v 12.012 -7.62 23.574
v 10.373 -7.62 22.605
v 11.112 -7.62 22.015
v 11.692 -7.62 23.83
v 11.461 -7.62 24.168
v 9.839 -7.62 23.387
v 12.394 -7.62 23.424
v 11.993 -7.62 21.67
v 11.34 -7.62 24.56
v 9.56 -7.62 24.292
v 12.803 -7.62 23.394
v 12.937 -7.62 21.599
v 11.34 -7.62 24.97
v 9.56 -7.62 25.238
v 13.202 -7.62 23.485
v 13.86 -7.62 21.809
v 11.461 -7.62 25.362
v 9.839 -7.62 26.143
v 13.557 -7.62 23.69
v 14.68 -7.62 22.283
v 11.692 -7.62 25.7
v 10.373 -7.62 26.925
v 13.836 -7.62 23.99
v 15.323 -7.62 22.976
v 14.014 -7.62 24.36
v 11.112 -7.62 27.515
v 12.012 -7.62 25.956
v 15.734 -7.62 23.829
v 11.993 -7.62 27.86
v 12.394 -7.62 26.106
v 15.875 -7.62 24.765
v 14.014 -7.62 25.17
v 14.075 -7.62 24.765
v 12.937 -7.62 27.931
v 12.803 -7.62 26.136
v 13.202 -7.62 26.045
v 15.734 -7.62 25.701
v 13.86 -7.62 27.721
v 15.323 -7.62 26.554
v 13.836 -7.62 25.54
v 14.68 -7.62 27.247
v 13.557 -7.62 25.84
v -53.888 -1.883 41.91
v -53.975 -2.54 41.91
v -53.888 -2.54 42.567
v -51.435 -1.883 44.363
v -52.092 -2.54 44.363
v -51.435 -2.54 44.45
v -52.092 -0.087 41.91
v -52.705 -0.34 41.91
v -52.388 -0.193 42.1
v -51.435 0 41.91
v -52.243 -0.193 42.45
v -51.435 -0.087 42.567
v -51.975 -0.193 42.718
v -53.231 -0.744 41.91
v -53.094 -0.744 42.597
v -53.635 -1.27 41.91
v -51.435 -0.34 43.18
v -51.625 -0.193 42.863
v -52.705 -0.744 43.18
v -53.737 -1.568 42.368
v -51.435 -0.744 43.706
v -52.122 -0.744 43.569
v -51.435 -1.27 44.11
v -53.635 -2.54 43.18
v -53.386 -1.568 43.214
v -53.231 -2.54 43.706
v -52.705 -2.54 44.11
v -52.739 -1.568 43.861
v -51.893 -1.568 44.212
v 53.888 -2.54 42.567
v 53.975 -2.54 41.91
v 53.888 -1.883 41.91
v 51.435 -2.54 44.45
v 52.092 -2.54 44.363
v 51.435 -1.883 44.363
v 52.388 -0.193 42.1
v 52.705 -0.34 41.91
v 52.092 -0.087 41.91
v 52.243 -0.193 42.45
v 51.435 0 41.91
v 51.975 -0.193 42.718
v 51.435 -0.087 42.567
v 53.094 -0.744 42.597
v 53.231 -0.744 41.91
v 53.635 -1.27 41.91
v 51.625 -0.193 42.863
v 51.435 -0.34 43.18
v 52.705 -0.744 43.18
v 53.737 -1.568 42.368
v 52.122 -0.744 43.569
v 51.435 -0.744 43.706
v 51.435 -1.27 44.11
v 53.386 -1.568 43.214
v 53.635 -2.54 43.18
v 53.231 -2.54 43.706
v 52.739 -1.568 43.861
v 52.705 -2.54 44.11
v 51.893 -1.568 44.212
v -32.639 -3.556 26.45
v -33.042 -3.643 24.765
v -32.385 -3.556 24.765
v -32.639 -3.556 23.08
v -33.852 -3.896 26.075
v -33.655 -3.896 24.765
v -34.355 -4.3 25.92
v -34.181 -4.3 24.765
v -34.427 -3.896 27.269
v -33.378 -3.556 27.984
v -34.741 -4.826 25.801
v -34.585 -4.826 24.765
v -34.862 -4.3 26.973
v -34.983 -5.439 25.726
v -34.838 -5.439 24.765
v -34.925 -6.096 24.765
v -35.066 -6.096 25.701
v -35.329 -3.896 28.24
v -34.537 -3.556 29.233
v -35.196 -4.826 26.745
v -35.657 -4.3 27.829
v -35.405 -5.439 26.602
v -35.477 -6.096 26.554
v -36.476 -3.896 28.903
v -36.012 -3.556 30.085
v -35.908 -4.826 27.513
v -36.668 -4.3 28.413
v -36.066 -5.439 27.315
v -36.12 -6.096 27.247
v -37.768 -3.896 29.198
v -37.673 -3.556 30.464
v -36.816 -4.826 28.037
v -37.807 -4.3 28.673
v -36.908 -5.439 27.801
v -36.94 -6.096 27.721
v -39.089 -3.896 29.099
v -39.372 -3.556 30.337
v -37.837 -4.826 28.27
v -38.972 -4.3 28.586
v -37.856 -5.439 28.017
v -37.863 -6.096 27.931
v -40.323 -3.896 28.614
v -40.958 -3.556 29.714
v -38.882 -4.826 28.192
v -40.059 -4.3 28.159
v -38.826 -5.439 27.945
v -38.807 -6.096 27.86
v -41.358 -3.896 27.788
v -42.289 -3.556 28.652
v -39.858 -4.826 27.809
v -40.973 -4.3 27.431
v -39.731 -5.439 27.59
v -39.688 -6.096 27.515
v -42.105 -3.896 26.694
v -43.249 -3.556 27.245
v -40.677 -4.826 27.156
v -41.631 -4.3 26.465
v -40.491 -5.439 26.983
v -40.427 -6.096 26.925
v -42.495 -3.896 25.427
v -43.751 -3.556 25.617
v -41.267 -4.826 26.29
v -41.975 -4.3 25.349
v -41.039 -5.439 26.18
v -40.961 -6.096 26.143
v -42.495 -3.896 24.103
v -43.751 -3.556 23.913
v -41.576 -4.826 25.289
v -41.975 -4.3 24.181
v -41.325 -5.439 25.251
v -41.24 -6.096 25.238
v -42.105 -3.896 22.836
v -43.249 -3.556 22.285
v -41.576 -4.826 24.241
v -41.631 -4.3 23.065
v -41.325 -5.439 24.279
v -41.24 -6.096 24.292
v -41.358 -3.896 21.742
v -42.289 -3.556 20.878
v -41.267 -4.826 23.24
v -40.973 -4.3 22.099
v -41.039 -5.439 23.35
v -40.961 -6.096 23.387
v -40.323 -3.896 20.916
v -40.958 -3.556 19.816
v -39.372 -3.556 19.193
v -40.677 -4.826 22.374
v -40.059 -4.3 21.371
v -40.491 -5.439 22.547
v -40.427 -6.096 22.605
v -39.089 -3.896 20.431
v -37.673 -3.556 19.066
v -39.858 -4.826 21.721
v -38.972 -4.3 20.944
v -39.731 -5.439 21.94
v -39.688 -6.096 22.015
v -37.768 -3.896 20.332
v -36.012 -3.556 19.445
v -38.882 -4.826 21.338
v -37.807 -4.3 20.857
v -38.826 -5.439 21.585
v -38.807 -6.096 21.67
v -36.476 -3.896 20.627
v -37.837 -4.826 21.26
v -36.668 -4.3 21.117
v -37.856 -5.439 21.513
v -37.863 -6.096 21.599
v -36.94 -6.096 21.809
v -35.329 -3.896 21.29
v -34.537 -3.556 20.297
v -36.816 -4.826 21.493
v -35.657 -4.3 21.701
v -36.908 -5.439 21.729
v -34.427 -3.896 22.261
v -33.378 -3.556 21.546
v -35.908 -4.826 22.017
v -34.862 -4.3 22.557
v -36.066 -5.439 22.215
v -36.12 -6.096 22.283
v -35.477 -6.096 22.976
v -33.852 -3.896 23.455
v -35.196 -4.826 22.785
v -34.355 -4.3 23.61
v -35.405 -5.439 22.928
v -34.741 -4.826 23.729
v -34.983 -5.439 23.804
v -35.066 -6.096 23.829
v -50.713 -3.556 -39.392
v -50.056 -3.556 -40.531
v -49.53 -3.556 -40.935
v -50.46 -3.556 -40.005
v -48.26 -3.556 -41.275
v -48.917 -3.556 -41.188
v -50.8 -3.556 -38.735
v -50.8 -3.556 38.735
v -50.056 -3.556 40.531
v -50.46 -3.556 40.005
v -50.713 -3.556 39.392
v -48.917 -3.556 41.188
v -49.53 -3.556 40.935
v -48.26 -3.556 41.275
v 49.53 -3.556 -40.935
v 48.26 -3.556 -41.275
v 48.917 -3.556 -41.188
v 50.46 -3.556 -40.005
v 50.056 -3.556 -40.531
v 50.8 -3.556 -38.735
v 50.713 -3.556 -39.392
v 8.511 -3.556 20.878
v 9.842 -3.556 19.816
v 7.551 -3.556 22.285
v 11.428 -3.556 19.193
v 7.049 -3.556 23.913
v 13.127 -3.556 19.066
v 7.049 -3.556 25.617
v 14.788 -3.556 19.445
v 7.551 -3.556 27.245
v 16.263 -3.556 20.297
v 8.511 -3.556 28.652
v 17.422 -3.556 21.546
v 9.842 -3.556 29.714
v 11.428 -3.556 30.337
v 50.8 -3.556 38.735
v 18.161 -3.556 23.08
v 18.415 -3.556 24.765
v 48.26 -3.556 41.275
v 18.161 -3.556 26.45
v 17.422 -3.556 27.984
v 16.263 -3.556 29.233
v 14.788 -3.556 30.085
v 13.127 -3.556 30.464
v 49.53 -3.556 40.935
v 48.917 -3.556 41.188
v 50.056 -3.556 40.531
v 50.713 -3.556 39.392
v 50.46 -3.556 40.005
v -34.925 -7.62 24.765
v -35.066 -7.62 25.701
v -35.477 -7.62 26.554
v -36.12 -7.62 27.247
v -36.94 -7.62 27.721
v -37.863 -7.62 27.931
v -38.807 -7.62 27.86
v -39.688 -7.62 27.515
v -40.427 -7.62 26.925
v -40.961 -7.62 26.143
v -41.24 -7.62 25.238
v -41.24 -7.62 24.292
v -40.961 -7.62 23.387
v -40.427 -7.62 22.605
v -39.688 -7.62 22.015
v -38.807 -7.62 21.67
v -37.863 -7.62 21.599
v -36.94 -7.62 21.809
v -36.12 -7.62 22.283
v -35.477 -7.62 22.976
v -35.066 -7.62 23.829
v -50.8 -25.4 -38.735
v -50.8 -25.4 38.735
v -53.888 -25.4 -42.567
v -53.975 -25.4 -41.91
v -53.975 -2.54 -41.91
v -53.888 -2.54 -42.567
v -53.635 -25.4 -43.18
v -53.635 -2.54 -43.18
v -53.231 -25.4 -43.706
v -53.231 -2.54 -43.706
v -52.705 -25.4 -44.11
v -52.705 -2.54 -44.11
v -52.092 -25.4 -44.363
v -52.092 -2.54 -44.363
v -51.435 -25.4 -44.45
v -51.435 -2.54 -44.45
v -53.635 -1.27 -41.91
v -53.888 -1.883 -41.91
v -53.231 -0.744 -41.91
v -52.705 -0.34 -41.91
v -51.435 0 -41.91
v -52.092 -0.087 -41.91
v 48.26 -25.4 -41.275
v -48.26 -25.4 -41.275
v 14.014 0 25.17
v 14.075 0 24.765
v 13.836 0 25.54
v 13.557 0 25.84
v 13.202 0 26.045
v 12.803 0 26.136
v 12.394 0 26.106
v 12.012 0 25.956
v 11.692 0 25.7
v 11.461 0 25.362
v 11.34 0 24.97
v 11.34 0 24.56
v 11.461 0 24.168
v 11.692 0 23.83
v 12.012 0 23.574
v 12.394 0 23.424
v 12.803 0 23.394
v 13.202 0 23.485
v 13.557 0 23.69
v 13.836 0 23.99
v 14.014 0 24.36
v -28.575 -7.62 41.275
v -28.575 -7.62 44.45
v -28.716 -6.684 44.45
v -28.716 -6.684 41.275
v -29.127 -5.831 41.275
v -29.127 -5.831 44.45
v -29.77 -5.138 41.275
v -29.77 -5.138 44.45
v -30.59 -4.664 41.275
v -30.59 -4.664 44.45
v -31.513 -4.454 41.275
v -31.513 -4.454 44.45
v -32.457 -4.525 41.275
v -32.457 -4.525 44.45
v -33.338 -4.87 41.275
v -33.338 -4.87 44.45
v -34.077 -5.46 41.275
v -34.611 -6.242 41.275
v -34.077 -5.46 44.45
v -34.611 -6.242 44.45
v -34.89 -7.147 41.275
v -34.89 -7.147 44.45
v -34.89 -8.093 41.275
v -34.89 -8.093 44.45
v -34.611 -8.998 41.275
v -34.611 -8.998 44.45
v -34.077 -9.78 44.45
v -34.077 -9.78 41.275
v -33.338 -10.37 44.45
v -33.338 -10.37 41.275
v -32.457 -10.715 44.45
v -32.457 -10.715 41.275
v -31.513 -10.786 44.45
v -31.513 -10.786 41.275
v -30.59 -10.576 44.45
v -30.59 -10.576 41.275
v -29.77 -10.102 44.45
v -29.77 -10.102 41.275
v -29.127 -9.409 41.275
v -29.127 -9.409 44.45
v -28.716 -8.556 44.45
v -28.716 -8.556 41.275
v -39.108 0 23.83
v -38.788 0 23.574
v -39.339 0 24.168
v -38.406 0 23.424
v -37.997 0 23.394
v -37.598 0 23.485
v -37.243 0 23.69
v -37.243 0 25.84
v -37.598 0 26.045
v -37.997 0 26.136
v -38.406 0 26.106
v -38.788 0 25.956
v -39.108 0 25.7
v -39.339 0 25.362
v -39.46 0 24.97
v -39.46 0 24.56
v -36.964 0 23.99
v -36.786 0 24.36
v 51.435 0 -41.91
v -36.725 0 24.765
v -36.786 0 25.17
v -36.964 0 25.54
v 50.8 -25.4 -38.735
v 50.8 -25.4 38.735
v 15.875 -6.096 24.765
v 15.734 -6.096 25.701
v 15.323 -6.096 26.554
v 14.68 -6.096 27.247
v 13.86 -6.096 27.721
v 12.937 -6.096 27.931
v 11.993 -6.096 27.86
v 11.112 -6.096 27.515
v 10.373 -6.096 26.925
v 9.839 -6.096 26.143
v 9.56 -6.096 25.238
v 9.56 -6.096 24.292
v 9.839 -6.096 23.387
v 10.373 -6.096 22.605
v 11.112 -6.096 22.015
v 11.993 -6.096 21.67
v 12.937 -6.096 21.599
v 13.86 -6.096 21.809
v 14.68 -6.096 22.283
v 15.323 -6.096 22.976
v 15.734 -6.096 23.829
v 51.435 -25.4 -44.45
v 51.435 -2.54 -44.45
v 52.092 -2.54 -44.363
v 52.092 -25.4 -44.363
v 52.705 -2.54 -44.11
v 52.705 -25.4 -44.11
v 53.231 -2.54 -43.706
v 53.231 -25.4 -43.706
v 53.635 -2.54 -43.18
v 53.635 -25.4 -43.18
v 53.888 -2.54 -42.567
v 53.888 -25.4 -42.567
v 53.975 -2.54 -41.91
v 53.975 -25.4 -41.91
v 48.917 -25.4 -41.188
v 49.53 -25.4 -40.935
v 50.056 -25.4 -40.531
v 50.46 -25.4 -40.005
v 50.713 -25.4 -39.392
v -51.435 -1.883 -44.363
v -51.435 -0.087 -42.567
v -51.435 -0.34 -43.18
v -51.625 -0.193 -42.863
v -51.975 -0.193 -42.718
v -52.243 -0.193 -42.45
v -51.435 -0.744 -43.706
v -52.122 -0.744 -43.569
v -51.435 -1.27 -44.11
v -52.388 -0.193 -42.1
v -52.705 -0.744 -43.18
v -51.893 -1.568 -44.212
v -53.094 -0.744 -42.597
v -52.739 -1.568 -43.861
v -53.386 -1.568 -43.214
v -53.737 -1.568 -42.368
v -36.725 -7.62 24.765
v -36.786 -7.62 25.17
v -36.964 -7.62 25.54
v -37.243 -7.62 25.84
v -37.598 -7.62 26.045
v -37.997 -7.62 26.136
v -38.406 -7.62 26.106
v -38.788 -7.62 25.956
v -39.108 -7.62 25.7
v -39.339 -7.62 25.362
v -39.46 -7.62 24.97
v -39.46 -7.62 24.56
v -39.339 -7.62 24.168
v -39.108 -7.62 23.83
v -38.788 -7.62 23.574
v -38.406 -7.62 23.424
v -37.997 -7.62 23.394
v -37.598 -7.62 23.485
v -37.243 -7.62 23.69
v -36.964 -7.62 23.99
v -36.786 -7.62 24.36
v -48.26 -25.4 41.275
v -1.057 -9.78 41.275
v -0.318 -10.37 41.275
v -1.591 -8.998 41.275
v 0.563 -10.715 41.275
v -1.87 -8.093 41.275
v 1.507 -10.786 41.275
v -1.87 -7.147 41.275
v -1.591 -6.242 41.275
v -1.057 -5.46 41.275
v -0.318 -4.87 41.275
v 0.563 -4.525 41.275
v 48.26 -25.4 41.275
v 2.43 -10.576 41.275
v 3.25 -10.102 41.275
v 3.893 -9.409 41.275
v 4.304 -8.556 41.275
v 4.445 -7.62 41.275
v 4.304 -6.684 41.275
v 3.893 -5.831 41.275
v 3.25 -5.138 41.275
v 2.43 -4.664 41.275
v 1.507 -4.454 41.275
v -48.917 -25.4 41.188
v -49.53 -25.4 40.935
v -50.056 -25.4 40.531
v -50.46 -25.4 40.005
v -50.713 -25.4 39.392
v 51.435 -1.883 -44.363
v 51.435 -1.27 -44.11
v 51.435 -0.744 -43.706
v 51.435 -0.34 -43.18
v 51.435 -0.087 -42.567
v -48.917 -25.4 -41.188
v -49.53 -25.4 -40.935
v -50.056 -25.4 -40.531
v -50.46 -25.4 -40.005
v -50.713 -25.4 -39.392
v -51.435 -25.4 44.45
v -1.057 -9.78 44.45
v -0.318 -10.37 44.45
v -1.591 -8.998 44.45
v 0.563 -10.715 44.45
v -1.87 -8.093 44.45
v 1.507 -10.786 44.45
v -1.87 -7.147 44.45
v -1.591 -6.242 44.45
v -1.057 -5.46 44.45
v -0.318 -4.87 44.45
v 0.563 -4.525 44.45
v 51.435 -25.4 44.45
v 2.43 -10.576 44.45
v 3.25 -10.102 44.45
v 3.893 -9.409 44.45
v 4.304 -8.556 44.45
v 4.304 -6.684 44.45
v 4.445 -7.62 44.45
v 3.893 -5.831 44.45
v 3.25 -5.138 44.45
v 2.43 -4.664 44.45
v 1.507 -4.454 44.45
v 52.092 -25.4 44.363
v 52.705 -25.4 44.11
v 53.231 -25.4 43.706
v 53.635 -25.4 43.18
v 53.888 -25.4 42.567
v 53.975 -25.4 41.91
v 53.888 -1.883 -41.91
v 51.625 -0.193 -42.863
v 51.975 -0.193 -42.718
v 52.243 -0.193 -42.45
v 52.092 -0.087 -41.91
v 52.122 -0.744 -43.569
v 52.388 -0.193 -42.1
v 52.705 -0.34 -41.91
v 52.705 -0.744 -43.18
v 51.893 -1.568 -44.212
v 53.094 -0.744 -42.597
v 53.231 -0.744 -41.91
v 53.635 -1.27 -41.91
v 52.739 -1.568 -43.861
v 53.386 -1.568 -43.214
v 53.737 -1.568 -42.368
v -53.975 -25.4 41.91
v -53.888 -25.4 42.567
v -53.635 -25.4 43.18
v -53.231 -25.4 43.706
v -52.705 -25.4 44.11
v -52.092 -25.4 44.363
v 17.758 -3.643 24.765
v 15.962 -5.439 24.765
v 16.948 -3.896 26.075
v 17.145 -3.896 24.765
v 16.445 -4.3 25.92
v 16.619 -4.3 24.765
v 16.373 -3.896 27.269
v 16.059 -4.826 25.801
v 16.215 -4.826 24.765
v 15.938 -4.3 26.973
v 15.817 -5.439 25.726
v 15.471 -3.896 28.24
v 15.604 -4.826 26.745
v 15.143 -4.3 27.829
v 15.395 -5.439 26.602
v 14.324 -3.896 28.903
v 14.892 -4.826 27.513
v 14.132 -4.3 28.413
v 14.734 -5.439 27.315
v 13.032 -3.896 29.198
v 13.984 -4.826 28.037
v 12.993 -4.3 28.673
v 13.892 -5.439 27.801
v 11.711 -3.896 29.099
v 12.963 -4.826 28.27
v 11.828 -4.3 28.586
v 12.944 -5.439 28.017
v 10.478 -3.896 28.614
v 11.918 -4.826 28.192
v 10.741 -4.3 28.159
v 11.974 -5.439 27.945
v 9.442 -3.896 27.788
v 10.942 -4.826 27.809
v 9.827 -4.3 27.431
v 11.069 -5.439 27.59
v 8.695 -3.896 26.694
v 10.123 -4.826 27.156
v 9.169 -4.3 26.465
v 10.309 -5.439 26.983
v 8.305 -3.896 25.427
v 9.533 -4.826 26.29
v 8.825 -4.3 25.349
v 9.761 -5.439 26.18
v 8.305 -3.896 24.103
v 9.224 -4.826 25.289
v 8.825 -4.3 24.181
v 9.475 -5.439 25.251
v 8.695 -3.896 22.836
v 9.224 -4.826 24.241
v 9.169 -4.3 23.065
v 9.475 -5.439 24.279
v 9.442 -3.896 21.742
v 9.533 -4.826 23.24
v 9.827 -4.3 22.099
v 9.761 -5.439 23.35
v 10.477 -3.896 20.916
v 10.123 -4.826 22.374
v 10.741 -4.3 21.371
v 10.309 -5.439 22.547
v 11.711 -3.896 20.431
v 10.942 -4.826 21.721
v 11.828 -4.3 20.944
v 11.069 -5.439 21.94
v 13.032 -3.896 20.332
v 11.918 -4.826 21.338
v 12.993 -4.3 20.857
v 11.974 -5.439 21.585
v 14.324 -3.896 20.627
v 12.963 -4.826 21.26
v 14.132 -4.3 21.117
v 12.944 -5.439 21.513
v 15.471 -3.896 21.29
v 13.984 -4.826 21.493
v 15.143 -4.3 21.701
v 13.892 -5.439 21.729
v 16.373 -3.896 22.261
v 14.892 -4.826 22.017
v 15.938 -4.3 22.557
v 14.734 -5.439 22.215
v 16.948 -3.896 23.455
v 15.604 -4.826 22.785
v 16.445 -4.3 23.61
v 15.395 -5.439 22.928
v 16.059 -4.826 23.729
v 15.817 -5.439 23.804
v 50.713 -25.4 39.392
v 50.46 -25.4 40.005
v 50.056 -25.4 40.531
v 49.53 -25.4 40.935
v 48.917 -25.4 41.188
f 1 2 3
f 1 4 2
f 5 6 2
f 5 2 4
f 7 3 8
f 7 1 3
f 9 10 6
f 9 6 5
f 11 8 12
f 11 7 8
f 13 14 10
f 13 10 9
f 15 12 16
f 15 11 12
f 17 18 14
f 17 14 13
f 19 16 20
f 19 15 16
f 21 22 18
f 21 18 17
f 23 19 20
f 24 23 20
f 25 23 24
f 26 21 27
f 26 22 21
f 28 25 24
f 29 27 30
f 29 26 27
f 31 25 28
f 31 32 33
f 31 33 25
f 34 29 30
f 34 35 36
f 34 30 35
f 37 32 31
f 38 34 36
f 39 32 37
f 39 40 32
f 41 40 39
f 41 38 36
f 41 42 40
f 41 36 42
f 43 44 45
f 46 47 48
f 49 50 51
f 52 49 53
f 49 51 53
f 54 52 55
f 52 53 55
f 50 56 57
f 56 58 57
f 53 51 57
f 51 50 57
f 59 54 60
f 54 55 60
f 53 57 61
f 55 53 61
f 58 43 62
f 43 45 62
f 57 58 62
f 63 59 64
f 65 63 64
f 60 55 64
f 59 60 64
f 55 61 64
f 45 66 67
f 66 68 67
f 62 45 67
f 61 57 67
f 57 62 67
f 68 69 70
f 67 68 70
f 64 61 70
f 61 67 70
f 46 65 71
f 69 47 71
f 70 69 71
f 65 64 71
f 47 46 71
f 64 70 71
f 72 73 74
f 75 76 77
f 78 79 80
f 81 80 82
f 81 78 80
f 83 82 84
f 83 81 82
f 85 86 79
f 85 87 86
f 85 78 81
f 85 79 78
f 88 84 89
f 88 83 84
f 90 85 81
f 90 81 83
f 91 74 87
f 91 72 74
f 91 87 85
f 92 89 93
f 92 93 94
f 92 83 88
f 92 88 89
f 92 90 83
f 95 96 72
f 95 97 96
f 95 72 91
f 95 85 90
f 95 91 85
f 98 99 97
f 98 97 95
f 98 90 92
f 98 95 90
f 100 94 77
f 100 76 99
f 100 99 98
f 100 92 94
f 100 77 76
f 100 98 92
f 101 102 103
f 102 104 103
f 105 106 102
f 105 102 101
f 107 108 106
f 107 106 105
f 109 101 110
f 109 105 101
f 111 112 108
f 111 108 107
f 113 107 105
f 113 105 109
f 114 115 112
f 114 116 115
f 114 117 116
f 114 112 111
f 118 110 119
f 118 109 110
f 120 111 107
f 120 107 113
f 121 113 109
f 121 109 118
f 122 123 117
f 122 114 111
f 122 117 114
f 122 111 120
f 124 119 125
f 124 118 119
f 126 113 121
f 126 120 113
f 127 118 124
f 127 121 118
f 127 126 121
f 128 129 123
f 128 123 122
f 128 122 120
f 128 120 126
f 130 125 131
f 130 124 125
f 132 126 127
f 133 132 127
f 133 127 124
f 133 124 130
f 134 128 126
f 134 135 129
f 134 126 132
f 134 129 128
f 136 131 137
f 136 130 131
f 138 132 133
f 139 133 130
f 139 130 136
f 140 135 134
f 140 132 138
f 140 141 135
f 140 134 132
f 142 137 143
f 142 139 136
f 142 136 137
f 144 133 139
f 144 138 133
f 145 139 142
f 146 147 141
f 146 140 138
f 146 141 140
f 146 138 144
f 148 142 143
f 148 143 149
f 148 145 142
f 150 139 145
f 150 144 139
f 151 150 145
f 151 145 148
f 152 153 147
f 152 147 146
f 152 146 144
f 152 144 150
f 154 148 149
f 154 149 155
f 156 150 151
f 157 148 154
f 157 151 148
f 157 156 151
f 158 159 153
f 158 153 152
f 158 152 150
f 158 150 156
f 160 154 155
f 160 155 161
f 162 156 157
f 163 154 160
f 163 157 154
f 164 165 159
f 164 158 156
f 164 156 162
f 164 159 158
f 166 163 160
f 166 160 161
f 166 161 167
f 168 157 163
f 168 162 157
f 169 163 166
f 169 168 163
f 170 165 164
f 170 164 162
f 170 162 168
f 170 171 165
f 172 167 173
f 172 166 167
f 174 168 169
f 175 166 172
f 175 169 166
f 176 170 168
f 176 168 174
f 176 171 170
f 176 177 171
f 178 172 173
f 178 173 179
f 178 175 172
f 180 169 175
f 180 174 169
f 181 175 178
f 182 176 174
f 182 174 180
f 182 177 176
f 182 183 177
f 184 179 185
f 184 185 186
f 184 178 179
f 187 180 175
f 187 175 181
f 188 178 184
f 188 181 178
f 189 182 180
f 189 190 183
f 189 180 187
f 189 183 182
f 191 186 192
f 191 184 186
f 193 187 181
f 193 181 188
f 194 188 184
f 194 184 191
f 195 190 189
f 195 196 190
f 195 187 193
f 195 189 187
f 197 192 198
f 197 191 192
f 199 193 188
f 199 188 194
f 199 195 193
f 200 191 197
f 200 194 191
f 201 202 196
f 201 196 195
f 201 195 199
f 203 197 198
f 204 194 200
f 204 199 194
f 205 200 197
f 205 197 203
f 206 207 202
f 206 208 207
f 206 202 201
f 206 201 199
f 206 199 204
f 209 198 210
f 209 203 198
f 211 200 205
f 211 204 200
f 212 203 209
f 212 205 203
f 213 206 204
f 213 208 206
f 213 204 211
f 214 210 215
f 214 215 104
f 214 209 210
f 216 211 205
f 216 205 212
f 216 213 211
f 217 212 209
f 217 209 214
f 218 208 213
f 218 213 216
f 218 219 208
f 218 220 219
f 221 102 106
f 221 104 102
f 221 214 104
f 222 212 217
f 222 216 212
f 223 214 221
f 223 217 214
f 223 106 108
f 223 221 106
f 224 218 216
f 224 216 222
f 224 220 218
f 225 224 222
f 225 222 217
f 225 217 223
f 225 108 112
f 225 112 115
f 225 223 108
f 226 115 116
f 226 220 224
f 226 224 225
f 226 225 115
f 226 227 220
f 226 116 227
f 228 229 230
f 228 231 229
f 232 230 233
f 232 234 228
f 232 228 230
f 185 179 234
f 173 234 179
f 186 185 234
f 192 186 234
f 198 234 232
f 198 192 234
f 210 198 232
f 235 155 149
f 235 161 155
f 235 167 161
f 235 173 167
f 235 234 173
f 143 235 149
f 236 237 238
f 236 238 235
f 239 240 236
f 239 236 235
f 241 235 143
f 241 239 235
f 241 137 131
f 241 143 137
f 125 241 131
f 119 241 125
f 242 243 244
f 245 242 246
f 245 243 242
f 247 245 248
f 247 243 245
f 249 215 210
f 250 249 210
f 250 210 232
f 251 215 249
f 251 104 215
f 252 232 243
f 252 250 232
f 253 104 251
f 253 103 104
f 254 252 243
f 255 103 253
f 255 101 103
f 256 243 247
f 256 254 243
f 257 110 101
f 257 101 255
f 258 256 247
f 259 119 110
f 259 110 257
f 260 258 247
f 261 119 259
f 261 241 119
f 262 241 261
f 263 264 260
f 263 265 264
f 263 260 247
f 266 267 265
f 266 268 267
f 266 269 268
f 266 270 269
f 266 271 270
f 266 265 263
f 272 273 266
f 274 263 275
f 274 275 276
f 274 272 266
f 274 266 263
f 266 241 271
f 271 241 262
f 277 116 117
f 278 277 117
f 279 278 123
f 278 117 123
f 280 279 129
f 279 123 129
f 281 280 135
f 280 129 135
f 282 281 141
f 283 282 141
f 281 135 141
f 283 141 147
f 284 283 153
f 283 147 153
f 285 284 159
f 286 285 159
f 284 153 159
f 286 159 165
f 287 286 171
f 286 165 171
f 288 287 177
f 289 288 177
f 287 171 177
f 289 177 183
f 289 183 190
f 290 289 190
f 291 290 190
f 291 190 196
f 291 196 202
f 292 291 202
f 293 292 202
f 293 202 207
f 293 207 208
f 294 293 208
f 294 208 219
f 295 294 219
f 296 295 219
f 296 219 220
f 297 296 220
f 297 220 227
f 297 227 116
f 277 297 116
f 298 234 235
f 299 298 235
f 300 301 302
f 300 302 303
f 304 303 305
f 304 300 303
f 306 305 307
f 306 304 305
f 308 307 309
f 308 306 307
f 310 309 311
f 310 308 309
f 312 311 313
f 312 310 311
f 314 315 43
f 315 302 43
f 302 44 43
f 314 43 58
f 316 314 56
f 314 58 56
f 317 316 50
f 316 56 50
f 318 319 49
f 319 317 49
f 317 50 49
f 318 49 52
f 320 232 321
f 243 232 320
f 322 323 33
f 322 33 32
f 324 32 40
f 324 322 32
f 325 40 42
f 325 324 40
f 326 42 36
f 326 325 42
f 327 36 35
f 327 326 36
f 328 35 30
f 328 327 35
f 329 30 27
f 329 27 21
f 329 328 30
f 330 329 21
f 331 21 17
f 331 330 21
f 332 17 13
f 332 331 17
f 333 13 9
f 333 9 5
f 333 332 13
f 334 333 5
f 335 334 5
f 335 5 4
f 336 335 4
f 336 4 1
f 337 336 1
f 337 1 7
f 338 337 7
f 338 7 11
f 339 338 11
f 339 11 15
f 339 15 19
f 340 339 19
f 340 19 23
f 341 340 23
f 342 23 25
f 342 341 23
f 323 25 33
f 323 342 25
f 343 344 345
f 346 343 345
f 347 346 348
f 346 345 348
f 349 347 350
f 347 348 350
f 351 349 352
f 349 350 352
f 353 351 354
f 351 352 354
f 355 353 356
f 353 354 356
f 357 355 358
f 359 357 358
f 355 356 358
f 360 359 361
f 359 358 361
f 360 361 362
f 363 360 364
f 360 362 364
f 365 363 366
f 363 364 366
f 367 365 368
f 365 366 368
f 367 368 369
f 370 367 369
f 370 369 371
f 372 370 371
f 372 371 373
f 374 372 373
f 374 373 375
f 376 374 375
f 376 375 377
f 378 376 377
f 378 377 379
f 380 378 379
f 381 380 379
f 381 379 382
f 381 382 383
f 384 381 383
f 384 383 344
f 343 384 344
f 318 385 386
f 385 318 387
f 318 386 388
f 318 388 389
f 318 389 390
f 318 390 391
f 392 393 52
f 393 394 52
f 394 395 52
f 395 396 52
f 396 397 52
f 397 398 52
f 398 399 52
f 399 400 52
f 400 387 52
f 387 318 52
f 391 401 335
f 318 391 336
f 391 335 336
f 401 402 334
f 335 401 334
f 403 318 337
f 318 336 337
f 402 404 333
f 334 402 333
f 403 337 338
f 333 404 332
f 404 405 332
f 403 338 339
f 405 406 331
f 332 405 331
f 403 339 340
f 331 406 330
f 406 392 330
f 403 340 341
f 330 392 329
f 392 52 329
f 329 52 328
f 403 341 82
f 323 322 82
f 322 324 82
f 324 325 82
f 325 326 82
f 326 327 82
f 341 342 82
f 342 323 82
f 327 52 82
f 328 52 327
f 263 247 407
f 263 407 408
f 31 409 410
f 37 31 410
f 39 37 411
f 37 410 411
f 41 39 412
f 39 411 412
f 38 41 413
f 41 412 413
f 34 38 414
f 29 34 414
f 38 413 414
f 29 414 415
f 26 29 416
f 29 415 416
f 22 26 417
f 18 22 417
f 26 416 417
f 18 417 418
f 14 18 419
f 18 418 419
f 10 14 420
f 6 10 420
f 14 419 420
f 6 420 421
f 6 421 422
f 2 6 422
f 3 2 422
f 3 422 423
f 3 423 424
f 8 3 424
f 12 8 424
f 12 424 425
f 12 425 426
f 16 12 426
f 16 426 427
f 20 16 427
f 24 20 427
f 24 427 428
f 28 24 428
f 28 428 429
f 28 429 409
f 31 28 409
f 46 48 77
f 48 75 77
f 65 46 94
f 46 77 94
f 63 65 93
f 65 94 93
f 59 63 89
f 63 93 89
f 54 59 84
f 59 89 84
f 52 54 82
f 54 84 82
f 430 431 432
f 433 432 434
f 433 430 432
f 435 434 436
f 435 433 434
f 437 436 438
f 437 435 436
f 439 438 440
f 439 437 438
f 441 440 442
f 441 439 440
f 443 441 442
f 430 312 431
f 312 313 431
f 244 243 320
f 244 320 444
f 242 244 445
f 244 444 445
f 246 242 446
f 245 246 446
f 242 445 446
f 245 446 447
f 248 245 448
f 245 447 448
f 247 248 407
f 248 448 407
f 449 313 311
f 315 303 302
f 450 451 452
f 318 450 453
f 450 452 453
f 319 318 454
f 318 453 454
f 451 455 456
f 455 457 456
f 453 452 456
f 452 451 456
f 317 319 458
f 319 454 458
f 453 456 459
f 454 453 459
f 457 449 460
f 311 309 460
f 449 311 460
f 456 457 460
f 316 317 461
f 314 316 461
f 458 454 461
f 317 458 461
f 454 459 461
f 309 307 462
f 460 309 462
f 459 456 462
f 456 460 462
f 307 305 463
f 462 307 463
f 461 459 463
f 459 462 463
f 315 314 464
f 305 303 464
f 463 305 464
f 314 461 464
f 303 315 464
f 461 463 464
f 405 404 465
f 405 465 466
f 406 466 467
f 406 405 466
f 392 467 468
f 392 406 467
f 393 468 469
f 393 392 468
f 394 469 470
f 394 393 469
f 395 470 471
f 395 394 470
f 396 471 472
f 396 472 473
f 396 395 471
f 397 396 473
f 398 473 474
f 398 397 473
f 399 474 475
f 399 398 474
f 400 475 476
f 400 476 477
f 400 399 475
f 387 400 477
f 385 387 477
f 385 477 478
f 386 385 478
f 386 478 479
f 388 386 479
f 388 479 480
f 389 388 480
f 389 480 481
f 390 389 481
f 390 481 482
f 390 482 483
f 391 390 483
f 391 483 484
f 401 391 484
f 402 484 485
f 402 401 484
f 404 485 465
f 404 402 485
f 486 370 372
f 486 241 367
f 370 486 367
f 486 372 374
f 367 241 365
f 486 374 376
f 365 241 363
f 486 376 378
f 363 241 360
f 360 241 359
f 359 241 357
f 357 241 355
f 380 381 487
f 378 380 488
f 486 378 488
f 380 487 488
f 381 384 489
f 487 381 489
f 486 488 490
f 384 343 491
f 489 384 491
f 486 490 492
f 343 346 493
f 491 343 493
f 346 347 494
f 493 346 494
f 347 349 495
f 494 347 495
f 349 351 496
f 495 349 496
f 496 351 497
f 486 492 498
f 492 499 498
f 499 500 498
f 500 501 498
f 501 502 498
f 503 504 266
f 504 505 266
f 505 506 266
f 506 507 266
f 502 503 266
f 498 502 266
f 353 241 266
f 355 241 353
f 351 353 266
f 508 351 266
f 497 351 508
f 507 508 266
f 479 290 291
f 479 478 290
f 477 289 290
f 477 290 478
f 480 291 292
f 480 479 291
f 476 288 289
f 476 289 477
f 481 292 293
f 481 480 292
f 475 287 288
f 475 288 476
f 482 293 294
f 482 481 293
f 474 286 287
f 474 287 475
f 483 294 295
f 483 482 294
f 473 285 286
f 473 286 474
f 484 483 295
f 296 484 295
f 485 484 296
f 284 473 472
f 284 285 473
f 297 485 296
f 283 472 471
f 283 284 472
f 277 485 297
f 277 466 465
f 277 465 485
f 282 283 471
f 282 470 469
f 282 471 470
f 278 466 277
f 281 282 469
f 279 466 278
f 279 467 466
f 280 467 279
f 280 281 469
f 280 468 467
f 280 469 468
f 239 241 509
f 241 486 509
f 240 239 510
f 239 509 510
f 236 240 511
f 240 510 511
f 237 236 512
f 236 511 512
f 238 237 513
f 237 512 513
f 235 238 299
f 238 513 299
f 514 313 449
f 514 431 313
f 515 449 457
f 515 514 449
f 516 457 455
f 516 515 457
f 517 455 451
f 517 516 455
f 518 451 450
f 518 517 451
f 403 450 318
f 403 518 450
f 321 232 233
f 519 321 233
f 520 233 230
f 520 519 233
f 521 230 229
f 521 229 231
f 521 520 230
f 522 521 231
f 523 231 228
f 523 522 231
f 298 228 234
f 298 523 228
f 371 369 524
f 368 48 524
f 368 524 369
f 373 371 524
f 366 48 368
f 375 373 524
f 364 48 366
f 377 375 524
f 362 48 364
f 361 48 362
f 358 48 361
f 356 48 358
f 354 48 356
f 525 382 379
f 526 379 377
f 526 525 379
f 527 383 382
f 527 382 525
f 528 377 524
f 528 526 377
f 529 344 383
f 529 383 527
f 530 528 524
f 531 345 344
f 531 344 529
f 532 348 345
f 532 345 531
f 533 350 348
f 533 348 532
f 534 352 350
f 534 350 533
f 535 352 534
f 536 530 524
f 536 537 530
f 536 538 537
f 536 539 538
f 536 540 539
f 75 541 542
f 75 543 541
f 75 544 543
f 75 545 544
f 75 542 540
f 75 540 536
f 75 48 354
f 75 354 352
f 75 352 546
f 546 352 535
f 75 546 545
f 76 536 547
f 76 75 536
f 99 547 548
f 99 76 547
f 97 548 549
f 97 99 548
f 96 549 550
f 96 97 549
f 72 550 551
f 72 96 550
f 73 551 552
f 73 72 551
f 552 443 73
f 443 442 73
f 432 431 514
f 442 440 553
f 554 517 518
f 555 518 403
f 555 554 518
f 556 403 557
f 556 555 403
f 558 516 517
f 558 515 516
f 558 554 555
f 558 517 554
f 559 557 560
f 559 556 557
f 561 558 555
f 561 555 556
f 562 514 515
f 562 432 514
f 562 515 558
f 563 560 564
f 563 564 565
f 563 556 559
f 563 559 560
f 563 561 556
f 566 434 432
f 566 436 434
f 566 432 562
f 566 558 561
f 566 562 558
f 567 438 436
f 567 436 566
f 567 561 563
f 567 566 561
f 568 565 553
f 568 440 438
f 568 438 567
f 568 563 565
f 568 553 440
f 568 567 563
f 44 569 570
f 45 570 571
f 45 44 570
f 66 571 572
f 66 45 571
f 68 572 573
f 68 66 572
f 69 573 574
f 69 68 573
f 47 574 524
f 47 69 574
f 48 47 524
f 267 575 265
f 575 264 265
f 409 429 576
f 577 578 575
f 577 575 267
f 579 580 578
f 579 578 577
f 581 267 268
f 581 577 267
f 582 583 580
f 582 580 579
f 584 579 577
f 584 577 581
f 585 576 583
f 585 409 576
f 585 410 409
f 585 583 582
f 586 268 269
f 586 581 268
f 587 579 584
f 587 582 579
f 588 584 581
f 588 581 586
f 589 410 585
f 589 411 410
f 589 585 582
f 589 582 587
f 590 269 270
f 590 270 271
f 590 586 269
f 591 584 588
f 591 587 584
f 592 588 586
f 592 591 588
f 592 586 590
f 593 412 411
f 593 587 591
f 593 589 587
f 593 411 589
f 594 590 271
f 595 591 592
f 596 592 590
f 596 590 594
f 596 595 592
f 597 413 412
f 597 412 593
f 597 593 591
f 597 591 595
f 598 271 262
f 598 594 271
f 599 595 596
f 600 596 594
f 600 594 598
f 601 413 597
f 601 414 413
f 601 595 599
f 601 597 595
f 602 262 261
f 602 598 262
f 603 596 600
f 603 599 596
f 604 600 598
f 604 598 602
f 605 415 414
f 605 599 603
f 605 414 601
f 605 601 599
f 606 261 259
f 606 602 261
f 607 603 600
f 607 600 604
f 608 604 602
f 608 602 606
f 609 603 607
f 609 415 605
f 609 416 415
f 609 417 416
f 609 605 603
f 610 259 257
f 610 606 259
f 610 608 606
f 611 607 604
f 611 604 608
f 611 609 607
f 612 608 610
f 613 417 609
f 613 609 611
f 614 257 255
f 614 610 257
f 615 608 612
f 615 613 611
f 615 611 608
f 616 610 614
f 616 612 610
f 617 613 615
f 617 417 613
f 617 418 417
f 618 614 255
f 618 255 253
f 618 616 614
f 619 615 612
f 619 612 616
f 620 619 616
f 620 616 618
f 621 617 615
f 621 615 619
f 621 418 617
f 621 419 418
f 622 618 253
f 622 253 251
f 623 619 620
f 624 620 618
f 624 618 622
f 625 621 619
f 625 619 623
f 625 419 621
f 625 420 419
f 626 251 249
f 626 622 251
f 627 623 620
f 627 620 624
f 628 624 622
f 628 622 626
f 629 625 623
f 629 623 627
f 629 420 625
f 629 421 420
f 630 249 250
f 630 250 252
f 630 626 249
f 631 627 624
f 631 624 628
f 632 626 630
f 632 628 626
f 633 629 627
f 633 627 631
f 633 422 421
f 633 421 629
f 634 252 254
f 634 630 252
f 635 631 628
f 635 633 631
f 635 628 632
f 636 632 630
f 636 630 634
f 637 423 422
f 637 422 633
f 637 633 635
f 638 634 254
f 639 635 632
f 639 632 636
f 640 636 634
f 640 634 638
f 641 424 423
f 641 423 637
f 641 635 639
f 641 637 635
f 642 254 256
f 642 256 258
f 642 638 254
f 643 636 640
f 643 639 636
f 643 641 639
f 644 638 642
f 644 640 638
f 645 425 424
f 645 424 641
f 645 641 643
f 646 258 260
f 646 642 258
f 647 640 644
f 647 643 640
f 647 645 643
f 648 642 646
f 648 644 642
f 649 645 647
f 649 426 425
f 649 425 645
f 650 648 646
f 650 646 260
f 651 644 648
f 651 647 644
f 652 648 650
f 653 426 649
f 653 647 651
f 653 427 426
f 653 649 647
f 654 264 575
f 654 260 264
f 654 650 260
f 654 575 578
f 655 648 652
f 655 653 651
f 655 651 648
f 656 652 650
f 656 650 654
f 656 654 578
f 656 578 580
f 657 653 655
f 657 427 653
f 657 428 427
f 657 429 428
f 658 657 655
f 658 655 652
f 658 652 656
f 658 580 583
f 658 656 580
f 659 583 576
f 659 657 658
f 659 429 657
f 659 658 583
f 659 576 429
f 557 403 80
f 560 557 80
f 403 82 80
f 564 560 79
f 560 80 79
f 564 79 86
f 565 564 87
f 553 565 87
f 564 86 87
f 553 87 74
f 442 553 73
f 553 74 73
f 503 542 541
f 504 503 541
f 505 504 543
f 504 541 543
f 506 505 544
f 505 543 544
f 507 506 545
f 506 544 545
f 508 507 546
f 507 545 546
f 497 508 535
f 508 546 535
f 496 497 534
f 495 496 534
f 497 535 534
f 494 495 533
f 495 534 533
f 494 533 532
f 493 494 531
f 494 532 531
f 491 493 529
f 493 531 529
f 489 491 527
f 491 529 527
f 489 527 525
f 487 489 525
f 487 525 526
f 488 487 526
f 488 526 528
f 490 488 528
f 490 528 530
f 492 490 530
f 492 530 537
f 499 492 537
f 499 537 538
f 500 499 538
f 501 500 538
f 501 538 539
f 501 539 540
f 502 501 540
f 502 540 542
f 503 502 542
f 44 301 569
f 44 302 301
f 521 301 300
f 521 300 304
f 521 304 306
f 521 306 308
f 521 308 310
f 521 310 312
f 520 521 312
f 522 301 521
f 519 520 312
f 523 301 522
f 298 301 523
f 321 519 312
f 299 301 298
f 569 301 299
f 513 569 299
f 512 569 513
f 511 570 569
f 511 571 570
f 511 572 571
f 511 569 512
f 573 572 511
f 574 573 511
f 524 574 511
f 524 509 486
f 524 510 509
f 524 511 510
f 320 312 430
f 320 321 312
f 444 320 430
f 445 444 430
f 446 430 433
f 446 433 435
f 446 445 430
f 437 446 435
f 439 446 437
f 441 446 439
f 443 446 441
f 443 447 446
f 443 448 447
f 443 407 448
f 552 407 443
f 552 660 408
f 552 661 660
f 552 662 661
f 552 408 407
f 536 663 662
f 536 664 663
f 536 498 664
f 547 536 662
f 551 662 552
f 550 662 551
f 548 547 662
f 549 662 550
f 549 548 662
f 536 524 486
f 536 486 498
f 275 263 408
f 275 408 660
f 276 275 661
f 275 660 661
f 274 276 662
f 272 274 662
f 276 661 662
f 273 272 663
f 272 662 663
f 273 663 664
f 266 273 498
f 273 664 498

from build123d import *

# Parameters (mm, degrees)
F0_W     = 107.95
F0_H     = 88.9
F0_W_2   = 101.6
F0_H_2   = 82.55
F0_R     = 3.175
F1_DEPTH = 3.556
F0_R_2   = 1.375
F2_DEPTH = 7.62
F3_DEPTH = 25.4
F4_R     = 3.175
F5_DEPTH = 5.08
F6_R     = 2.54


with BuildPart() as f1:
    # F0 (on Front) → F1 (new body)
    with BuildSketch(Plane.XZ):
        Rectangle(F0_W, F0_H)
        Rectangle(F0_W_2, F0_H_2, mode=Mode.SUBTRACT)
        Rectangle(F0_W_2, F0_H_2)
        with Locations((-38.1, 24.765)):
            Circle(F0_R, mode=Mode.SUBTRACT)
        with Locations((12.7, 24.765)):
            Circle(F0_R, mode=Mode.SUBTRACT)
    extrude(amount=F1_DEPTH)

    # F0 (on Front) → F2 (join)
    with BuildSketch(Plane.XZ):
        with Locations((-38.1, 24.765)):
            Circle(F0_R)
        with Locations((-38.1, 24.765)):
            Circle(F0_R_2, mode=Mode.SUBTRACT)
        with Locations((12.7, 24.765)):
            Circle(F0_R)
        with Locations((12.7, 24.765)):
            Circle(F0_R_2, mode=Mode.SUBTRACT)
    extrude(amount=F2_DEPTH)

    # F0 (on Front) → F3 (join)
    with BuildSketch(Plane.XZ):
        Rectangle(F0_W, F0_H)
        Rectangle(F0_W_2, F0_H_2, mode=Mode.SUBTRACT)
    extrude(amount=F3_DEPTH)

    # F4 (on face) → F5 (cut)
    with BuildSketch(Plane.XY.offset(44.45)):
        with Locations((1.27, -7.62)):
            Circle(F4_R)
        with Locations((-31.75, -7.62)):
            Circle(F4_R)
    extrude(amount=-F5_DEPTH, mode=Mode.SUBTRACT)

    # F6
    f6_edges = [f1.edges().sort_by_distance(p)[0] for p in [
        (-53.975, -12.7, 44.45),
        (-50.8, -14.478, 41.275),
        (53.975, -12.7, 44.45),
        (-53.975, -12.7, -44.45),
        (50.8, -14.478, 41.275),
        (-50.8, -14.478, -41.275),
        (53.975, -12.7, -44.45),
        (50.8, -14.478, -41.275),
        (0, 0, -44.45),
        (53.975, 0, 0),
        (-53.975, 0, 0),
        (0, 0, 44.45),
        (9.525, -3.556, 24.765),
        (-41.275, -3.556, 24.765),
    ]]
    fillet(f6_edges, radius=F6_R)


solid = f1.part
